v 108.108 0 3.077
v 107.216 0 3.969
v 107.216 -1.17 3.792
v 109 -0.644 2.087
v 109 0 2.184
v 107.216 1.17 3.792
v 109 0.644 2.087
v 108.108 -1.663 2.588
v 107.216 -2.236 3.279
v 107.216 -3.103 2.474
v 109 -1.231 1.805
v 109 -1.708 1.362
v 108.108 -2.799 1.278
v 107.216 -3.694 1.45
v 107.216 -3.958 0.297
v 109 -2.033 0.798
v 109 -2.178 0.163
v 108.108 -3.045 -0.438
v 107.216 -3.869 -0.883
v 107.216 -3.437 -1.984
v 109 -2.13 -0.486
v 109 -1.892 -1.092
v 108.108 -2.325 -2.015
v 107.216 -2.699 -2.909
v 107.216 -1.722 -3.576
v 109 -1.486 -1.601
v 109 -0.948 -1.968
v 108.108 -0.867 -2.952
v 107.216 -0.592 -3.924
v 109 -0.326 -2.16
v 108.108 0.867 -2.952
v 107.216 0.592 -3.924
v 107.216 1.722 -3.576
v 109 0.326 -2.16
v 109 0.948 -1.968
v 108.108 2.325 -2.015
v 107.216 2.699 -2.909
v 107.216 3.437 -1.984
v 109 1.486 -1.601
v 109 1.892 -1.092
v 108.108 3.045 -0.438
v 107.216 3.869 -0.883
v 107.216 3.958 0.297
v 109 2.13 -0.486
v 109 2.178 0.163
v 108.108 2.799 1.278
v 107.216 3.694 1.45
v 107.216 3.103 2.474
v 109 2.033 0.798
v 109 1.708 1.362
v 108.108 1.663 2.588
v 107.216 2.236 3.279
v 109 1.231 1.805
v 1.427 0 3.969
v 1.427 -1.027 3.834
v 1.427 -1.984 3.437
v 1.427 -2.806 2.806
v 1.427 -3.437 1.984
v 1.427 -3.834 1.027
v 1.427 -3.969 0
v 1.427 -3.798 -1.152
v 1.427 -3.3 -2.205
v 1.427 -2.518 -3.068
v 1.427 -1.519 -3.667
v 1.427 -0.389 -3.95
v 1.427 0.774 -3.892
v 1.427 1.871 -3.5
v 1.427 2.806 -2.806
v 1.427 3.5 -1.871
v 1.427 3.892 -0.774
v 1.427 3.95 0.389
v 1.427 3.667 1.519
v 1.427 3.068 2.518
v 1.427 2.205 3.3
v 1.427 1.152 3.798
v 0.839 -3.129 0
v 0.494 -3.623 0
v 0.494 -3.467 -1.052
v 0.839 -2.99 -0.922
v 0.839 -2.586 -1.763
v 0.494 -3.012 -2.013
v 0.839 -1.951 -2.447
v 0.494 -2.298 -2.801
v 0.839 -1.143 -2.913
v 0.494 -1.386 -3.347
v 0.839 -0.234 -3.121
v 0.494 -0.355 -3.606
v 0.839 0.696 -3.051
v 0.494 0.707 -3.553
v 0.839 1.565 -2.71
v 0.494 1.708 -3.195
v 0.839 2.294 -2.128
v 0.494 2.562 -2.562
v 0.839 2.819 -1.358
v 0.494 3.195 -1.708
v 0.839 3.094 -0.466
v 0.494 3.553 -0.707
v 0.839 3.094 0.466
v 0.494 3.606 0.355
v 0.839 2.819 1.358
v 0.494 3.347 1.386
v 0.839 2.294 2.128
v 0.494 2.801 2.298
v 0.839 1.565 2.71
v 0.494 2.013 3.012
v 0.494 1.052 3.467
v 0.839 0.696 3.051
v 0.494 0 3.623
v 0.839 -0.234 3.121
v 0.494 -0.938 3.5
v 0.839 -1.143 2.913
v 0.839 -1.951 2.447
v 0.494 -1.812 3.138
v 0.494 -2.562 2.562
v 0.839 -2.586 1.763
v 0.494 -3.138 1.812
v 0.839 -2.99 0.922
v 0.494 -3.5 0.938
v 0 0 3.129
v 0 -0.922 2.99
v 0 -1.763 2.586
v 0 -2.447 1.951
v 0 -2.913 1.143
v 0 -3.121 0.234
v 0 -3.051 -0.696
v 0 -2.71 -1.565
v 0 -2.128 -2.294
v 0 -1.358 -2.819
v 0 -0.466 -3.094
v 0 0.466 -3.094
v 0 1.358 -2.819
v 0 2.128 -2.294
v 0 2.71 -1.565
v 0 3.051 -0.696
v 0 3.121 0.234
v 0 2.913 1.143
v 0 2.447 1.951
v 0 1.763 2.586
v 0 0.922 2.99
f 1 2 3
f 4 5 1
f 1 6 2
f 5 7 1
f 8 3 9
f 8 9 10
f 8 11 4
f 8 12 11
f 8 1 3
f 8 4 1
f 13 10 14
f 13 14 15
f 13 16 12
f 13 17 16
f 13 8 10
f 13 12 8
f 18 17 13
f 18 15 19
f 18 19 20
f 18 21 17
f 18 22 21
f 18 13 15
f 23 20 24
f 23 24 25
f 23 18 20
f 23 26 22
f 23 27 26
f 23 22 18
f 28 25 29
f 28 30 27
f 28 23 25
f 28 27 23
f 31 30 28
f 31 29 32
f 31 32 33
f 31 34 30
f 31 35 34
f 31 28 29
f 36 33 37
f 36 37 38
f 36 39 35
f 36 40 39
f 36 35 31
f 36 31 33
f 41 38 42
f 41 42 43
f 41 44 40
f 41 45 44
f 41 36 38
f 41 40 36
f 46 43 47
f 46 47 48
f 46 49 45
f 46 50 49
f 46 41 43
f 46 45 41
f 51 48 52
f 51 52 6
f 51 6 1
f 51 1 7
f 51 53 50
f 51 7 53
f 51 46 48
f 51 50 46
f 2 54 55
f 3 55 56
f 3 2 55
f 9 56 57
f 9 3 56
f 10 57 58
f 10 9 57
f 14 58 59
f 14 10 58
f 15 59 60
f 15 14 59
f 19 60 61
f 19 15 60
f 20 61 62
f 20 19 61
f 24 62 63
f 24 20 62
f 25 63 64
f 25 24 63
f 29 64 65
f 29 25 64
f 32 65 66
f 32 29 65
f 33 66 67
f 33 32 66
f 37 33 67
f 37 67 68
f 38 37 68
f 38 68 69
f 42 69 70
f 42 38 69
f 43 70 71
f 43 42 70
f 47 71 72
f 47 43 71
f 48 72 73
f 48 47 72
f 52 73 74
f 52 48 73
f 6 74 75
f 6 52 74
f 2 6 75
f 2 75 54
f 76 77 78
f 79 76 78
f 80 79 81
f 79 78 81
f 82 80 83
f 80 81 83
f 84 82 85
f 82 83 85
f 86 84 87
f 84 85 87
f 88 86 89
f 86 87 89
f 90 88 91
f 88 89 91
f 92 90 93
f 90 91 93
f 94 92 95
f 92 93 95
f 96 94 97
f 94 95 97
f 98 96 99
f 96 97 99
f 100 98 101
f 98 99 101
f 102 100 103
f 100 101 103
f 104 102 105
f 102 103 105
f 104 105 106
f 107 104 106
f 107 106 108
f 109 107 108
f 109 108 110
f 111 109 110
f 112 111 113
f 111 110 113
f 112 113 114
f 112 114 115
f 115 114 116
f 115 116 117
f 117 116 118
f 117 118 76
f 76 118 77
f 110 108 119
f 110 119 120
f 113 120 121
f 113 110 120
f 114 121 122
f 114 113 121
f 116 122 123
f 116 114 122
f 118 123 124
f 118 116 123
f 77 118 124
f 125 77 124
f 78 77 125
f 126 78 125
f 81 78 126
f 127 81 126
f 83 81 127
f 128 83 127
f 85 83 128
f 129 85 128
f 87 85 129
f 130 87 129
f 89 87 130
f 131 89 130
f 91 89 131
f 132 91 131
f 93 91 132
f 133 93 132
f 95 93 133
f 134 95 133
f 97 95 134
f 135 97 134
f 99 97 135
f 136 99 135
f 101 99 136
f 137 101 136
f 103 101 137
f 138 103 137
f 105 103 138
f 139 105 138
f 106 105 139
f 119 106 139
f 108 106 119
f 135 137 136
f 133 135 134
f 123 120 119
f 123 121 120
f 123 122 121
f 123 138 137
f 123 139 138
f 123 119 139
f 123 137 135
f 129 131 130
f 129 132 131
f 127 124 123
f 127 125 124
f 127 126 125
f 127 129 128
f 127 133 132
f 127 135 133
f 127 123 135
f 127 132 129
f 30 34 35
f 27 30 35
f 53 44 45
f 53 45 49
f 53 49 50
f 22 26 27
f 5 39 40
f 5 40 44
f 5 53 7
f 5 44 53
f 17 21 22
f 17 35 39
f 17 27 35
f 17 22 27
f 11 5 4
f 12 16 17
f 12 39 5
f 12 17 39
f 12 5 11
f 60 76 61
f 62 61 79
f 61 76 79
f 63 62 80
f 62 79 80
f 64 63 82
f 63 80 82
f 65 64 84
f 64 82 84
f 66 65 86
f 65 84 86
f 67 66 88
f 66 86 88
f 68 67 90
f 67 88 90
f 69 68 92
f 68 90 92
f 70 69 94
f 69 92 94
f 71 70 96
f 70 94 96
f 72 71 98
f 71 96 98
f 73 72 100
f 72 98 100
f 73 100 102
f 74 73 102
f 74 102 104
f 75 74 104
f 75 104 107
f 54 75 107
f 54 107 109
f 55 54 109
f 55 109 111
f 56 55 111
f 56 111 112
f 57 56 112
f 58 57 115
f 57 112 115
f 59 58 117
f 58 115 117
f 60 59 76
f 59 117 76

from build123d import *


with BuildPart() as part:
    # BodySke → BaseBody (revolve)
    with BuildSketch(Plane.XY, mode=Mode.PRIVATE) as basebody_sk:
        Polygon((0, 0), (0, 3.12928), (0.83947, 3.96875), (107.215649932, 3.96875), (108.999999932, 2.1844), (108.999999932, 0), align=None)
    revolve(basebody_sk.sketch.rotate(Axis((-12.7, 0, 0), (1, 0, 0)), 90), axis=Axis((-12.7, 0, 0), (1, 0, 0)))

    # ThdSchSke → ThreadSchematic (revolve, cut)
    with BuildSketch(Plane.XY):
        Polygon((0.83947, -3.12928), (0.251666778, -3.96875), (0.251666778, -4.9609375), (1.427273222, -4.9609375), (1.427273222, -3.96875), align=None)
    revolve(axis=Axis((-3.175, 0, 0), (1, 0, 0)), mode=Mode.SUBTRACT)


solid = part.part
